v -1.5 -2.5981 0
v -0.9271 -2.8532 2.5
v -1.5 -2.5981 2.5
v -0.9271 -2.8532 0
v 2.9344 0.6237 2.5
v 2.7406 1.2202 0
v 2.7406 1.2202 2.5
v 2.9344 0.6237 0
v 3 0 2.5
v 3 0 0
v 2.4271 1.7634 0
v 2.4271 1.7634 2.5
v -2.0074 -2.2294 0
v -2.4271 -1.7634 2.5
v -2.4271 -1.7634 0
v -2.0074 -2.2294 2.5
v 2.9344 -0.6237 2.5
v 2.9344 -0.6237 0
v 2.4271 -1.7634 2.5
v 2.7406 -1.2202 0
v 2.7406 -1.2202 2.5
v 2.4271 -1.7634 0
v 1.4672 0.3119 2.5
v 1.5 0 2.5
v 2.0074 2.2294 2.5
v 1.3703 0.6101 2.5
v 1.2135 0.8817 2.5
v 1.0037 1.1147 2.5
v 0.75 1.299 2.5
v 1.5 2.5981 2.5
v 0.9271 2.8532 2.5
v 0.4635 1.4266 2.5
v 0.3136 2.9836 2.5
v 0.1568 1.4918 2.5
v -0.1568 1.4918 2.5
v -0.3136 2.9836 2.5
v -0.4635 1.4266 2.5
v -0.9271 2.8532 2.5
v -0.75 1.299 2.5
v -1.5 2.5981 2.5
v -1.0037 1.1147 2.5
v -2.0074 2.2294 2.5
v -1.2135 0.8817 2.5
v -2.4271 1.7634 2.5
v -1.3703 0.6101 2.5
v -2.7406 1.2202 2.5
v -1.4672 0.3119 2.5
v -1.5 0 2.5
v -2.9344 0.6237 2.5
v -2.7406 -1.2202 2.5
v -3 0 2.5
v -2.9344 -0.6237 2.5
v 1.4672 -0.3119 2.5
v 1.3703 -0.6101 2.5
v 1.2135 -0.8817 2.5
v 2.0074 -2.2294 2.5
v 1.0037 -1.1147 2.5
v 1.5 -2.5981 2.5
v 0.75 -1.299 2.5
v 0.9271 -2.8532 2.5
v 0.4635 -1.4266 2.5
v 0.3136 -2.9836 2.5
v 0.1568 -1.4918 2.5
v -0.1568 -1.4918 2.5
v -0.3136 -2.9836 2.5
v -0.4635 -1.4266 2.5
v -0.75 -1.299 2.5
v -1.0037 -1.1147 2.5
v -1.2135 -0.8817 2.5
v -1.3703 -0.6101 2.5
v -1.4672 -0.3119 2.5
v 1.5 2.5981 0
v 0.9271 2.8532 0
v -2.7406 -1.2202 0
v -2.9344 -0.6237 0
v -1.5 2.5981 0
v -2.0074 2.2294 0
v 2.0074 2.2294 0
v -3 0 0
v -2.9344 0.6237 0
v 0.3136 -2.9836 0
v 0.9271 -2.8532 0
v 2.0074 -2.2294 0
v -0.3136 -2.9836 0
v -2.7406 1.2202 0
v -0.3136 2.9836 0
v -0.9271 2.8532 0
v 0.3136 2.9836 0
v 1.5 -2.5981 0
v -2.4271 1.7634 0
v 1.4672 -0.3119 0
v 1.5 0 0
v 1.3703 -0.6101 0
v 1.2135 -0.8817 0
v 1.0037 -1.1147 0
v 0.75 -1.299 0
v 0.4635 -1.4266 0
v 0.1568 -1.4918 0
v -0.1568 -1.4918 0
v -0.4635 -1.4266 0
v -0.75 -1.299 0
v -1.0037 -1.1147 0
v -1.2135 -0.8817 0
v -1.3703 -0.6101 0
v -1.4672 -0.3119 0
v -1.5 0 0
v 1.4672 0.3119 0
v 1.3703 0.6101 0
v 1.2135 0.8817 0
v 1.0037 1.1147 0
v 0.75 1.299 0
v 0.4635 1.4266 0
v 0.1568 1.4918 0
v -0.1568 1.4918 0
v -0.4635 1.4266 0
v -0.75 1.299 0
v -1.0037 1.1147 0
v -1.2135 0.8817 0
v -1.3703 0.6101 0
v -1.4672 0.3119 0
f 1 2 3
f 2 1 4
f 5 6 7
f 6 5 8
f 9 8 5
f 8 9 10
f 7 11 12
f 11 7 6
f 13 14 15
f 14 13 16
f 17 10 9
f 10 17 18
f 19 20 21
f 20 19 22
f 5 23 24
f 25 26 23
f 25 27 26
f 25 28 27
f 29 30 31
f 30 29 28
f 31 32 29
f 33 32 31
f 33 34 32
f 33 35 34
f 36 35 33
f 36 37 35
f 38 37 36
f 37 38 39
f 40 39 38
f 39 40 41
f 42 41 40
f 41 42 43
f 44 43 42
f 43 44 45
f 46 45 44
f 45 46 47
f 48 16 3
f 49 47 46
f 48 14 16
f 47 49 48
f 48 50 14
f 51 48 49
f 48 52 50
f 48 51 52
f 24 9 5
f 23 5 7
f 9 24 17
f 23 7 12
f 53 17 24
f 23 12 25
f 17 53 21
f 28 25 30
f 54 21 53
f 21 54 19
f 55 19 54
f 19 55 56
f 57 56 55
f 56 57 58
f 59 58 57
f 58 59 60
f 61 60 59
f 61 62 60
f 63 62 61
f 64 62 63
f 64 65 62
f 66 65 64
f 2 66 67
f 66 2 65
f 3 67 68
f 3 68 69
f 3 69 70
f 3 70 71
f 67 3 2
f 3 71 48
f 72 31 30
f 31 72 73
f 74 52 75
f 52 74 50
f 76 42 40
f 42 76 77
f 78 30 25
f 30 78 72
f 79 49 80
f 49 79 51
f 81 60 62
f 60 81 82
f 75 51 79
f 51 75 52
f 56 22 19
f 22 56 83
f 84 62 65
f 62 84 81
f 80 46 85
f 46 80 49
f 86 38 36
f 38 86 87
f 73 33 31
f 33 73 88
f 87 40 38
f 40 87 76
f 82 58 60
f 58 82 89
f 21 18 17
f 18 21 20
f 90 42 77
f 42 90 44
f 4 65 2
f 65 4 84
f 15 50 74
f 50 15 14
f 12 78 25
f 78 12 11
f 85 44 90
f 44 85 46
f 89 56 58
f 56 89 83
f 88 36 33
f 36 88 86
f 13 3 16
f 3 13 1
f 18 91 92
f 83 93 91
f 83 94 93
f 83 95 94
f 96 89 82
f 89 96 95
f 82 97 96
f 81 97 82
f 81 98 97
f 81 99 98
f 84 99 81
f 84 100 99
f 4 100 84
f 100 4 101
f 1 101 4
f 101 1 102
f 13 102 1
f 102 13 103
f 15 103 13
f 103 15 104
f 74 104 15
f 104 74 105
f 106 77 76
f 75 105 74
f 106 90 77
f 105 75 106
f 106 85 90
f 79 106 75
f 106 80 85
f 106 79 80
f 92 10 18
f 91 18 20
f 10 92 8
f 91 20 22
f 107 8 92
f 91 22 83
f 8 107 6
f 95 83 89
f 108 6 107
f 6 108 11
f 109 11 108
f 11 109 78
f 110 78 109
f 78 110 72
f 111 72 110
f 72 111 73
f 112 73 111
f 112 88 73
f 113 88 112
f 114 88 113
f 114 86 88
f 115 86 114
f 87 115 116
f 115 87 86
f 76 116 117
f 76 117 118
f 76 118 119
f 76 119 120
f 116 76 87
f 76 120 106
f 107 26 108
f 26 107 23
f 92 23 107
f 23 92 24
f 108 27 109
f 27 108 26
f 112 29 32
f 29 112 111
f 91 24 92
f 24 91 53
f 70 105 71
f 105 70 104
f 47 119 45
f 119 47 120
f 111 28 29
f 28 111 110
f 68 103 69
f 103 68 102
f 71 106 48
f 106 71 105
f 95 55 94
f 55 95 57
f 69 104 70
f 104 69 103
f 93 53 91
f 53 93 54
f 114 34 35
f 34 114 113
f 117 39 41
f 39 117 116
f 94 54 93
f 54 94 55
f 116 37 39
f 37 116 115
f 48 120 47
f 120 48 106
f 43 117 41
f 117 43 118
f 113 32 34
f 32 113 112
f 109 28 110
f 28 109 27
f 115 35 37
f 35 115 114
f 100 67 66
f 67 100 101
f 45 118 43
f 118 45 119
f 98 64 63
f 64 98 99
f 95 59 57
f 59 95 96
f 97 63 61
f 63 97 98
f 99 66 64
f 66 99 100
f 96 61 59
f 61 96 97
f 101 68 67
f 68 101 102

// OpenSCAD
module bearing63(){
  $fs=0.01;
  color("dimgray")
  difference(){
    cylinder(h=2.5, r=3);
    translate([0,0,-0.1]) cylinder(h=3,r=1.5);
  }
}

bearing63();
